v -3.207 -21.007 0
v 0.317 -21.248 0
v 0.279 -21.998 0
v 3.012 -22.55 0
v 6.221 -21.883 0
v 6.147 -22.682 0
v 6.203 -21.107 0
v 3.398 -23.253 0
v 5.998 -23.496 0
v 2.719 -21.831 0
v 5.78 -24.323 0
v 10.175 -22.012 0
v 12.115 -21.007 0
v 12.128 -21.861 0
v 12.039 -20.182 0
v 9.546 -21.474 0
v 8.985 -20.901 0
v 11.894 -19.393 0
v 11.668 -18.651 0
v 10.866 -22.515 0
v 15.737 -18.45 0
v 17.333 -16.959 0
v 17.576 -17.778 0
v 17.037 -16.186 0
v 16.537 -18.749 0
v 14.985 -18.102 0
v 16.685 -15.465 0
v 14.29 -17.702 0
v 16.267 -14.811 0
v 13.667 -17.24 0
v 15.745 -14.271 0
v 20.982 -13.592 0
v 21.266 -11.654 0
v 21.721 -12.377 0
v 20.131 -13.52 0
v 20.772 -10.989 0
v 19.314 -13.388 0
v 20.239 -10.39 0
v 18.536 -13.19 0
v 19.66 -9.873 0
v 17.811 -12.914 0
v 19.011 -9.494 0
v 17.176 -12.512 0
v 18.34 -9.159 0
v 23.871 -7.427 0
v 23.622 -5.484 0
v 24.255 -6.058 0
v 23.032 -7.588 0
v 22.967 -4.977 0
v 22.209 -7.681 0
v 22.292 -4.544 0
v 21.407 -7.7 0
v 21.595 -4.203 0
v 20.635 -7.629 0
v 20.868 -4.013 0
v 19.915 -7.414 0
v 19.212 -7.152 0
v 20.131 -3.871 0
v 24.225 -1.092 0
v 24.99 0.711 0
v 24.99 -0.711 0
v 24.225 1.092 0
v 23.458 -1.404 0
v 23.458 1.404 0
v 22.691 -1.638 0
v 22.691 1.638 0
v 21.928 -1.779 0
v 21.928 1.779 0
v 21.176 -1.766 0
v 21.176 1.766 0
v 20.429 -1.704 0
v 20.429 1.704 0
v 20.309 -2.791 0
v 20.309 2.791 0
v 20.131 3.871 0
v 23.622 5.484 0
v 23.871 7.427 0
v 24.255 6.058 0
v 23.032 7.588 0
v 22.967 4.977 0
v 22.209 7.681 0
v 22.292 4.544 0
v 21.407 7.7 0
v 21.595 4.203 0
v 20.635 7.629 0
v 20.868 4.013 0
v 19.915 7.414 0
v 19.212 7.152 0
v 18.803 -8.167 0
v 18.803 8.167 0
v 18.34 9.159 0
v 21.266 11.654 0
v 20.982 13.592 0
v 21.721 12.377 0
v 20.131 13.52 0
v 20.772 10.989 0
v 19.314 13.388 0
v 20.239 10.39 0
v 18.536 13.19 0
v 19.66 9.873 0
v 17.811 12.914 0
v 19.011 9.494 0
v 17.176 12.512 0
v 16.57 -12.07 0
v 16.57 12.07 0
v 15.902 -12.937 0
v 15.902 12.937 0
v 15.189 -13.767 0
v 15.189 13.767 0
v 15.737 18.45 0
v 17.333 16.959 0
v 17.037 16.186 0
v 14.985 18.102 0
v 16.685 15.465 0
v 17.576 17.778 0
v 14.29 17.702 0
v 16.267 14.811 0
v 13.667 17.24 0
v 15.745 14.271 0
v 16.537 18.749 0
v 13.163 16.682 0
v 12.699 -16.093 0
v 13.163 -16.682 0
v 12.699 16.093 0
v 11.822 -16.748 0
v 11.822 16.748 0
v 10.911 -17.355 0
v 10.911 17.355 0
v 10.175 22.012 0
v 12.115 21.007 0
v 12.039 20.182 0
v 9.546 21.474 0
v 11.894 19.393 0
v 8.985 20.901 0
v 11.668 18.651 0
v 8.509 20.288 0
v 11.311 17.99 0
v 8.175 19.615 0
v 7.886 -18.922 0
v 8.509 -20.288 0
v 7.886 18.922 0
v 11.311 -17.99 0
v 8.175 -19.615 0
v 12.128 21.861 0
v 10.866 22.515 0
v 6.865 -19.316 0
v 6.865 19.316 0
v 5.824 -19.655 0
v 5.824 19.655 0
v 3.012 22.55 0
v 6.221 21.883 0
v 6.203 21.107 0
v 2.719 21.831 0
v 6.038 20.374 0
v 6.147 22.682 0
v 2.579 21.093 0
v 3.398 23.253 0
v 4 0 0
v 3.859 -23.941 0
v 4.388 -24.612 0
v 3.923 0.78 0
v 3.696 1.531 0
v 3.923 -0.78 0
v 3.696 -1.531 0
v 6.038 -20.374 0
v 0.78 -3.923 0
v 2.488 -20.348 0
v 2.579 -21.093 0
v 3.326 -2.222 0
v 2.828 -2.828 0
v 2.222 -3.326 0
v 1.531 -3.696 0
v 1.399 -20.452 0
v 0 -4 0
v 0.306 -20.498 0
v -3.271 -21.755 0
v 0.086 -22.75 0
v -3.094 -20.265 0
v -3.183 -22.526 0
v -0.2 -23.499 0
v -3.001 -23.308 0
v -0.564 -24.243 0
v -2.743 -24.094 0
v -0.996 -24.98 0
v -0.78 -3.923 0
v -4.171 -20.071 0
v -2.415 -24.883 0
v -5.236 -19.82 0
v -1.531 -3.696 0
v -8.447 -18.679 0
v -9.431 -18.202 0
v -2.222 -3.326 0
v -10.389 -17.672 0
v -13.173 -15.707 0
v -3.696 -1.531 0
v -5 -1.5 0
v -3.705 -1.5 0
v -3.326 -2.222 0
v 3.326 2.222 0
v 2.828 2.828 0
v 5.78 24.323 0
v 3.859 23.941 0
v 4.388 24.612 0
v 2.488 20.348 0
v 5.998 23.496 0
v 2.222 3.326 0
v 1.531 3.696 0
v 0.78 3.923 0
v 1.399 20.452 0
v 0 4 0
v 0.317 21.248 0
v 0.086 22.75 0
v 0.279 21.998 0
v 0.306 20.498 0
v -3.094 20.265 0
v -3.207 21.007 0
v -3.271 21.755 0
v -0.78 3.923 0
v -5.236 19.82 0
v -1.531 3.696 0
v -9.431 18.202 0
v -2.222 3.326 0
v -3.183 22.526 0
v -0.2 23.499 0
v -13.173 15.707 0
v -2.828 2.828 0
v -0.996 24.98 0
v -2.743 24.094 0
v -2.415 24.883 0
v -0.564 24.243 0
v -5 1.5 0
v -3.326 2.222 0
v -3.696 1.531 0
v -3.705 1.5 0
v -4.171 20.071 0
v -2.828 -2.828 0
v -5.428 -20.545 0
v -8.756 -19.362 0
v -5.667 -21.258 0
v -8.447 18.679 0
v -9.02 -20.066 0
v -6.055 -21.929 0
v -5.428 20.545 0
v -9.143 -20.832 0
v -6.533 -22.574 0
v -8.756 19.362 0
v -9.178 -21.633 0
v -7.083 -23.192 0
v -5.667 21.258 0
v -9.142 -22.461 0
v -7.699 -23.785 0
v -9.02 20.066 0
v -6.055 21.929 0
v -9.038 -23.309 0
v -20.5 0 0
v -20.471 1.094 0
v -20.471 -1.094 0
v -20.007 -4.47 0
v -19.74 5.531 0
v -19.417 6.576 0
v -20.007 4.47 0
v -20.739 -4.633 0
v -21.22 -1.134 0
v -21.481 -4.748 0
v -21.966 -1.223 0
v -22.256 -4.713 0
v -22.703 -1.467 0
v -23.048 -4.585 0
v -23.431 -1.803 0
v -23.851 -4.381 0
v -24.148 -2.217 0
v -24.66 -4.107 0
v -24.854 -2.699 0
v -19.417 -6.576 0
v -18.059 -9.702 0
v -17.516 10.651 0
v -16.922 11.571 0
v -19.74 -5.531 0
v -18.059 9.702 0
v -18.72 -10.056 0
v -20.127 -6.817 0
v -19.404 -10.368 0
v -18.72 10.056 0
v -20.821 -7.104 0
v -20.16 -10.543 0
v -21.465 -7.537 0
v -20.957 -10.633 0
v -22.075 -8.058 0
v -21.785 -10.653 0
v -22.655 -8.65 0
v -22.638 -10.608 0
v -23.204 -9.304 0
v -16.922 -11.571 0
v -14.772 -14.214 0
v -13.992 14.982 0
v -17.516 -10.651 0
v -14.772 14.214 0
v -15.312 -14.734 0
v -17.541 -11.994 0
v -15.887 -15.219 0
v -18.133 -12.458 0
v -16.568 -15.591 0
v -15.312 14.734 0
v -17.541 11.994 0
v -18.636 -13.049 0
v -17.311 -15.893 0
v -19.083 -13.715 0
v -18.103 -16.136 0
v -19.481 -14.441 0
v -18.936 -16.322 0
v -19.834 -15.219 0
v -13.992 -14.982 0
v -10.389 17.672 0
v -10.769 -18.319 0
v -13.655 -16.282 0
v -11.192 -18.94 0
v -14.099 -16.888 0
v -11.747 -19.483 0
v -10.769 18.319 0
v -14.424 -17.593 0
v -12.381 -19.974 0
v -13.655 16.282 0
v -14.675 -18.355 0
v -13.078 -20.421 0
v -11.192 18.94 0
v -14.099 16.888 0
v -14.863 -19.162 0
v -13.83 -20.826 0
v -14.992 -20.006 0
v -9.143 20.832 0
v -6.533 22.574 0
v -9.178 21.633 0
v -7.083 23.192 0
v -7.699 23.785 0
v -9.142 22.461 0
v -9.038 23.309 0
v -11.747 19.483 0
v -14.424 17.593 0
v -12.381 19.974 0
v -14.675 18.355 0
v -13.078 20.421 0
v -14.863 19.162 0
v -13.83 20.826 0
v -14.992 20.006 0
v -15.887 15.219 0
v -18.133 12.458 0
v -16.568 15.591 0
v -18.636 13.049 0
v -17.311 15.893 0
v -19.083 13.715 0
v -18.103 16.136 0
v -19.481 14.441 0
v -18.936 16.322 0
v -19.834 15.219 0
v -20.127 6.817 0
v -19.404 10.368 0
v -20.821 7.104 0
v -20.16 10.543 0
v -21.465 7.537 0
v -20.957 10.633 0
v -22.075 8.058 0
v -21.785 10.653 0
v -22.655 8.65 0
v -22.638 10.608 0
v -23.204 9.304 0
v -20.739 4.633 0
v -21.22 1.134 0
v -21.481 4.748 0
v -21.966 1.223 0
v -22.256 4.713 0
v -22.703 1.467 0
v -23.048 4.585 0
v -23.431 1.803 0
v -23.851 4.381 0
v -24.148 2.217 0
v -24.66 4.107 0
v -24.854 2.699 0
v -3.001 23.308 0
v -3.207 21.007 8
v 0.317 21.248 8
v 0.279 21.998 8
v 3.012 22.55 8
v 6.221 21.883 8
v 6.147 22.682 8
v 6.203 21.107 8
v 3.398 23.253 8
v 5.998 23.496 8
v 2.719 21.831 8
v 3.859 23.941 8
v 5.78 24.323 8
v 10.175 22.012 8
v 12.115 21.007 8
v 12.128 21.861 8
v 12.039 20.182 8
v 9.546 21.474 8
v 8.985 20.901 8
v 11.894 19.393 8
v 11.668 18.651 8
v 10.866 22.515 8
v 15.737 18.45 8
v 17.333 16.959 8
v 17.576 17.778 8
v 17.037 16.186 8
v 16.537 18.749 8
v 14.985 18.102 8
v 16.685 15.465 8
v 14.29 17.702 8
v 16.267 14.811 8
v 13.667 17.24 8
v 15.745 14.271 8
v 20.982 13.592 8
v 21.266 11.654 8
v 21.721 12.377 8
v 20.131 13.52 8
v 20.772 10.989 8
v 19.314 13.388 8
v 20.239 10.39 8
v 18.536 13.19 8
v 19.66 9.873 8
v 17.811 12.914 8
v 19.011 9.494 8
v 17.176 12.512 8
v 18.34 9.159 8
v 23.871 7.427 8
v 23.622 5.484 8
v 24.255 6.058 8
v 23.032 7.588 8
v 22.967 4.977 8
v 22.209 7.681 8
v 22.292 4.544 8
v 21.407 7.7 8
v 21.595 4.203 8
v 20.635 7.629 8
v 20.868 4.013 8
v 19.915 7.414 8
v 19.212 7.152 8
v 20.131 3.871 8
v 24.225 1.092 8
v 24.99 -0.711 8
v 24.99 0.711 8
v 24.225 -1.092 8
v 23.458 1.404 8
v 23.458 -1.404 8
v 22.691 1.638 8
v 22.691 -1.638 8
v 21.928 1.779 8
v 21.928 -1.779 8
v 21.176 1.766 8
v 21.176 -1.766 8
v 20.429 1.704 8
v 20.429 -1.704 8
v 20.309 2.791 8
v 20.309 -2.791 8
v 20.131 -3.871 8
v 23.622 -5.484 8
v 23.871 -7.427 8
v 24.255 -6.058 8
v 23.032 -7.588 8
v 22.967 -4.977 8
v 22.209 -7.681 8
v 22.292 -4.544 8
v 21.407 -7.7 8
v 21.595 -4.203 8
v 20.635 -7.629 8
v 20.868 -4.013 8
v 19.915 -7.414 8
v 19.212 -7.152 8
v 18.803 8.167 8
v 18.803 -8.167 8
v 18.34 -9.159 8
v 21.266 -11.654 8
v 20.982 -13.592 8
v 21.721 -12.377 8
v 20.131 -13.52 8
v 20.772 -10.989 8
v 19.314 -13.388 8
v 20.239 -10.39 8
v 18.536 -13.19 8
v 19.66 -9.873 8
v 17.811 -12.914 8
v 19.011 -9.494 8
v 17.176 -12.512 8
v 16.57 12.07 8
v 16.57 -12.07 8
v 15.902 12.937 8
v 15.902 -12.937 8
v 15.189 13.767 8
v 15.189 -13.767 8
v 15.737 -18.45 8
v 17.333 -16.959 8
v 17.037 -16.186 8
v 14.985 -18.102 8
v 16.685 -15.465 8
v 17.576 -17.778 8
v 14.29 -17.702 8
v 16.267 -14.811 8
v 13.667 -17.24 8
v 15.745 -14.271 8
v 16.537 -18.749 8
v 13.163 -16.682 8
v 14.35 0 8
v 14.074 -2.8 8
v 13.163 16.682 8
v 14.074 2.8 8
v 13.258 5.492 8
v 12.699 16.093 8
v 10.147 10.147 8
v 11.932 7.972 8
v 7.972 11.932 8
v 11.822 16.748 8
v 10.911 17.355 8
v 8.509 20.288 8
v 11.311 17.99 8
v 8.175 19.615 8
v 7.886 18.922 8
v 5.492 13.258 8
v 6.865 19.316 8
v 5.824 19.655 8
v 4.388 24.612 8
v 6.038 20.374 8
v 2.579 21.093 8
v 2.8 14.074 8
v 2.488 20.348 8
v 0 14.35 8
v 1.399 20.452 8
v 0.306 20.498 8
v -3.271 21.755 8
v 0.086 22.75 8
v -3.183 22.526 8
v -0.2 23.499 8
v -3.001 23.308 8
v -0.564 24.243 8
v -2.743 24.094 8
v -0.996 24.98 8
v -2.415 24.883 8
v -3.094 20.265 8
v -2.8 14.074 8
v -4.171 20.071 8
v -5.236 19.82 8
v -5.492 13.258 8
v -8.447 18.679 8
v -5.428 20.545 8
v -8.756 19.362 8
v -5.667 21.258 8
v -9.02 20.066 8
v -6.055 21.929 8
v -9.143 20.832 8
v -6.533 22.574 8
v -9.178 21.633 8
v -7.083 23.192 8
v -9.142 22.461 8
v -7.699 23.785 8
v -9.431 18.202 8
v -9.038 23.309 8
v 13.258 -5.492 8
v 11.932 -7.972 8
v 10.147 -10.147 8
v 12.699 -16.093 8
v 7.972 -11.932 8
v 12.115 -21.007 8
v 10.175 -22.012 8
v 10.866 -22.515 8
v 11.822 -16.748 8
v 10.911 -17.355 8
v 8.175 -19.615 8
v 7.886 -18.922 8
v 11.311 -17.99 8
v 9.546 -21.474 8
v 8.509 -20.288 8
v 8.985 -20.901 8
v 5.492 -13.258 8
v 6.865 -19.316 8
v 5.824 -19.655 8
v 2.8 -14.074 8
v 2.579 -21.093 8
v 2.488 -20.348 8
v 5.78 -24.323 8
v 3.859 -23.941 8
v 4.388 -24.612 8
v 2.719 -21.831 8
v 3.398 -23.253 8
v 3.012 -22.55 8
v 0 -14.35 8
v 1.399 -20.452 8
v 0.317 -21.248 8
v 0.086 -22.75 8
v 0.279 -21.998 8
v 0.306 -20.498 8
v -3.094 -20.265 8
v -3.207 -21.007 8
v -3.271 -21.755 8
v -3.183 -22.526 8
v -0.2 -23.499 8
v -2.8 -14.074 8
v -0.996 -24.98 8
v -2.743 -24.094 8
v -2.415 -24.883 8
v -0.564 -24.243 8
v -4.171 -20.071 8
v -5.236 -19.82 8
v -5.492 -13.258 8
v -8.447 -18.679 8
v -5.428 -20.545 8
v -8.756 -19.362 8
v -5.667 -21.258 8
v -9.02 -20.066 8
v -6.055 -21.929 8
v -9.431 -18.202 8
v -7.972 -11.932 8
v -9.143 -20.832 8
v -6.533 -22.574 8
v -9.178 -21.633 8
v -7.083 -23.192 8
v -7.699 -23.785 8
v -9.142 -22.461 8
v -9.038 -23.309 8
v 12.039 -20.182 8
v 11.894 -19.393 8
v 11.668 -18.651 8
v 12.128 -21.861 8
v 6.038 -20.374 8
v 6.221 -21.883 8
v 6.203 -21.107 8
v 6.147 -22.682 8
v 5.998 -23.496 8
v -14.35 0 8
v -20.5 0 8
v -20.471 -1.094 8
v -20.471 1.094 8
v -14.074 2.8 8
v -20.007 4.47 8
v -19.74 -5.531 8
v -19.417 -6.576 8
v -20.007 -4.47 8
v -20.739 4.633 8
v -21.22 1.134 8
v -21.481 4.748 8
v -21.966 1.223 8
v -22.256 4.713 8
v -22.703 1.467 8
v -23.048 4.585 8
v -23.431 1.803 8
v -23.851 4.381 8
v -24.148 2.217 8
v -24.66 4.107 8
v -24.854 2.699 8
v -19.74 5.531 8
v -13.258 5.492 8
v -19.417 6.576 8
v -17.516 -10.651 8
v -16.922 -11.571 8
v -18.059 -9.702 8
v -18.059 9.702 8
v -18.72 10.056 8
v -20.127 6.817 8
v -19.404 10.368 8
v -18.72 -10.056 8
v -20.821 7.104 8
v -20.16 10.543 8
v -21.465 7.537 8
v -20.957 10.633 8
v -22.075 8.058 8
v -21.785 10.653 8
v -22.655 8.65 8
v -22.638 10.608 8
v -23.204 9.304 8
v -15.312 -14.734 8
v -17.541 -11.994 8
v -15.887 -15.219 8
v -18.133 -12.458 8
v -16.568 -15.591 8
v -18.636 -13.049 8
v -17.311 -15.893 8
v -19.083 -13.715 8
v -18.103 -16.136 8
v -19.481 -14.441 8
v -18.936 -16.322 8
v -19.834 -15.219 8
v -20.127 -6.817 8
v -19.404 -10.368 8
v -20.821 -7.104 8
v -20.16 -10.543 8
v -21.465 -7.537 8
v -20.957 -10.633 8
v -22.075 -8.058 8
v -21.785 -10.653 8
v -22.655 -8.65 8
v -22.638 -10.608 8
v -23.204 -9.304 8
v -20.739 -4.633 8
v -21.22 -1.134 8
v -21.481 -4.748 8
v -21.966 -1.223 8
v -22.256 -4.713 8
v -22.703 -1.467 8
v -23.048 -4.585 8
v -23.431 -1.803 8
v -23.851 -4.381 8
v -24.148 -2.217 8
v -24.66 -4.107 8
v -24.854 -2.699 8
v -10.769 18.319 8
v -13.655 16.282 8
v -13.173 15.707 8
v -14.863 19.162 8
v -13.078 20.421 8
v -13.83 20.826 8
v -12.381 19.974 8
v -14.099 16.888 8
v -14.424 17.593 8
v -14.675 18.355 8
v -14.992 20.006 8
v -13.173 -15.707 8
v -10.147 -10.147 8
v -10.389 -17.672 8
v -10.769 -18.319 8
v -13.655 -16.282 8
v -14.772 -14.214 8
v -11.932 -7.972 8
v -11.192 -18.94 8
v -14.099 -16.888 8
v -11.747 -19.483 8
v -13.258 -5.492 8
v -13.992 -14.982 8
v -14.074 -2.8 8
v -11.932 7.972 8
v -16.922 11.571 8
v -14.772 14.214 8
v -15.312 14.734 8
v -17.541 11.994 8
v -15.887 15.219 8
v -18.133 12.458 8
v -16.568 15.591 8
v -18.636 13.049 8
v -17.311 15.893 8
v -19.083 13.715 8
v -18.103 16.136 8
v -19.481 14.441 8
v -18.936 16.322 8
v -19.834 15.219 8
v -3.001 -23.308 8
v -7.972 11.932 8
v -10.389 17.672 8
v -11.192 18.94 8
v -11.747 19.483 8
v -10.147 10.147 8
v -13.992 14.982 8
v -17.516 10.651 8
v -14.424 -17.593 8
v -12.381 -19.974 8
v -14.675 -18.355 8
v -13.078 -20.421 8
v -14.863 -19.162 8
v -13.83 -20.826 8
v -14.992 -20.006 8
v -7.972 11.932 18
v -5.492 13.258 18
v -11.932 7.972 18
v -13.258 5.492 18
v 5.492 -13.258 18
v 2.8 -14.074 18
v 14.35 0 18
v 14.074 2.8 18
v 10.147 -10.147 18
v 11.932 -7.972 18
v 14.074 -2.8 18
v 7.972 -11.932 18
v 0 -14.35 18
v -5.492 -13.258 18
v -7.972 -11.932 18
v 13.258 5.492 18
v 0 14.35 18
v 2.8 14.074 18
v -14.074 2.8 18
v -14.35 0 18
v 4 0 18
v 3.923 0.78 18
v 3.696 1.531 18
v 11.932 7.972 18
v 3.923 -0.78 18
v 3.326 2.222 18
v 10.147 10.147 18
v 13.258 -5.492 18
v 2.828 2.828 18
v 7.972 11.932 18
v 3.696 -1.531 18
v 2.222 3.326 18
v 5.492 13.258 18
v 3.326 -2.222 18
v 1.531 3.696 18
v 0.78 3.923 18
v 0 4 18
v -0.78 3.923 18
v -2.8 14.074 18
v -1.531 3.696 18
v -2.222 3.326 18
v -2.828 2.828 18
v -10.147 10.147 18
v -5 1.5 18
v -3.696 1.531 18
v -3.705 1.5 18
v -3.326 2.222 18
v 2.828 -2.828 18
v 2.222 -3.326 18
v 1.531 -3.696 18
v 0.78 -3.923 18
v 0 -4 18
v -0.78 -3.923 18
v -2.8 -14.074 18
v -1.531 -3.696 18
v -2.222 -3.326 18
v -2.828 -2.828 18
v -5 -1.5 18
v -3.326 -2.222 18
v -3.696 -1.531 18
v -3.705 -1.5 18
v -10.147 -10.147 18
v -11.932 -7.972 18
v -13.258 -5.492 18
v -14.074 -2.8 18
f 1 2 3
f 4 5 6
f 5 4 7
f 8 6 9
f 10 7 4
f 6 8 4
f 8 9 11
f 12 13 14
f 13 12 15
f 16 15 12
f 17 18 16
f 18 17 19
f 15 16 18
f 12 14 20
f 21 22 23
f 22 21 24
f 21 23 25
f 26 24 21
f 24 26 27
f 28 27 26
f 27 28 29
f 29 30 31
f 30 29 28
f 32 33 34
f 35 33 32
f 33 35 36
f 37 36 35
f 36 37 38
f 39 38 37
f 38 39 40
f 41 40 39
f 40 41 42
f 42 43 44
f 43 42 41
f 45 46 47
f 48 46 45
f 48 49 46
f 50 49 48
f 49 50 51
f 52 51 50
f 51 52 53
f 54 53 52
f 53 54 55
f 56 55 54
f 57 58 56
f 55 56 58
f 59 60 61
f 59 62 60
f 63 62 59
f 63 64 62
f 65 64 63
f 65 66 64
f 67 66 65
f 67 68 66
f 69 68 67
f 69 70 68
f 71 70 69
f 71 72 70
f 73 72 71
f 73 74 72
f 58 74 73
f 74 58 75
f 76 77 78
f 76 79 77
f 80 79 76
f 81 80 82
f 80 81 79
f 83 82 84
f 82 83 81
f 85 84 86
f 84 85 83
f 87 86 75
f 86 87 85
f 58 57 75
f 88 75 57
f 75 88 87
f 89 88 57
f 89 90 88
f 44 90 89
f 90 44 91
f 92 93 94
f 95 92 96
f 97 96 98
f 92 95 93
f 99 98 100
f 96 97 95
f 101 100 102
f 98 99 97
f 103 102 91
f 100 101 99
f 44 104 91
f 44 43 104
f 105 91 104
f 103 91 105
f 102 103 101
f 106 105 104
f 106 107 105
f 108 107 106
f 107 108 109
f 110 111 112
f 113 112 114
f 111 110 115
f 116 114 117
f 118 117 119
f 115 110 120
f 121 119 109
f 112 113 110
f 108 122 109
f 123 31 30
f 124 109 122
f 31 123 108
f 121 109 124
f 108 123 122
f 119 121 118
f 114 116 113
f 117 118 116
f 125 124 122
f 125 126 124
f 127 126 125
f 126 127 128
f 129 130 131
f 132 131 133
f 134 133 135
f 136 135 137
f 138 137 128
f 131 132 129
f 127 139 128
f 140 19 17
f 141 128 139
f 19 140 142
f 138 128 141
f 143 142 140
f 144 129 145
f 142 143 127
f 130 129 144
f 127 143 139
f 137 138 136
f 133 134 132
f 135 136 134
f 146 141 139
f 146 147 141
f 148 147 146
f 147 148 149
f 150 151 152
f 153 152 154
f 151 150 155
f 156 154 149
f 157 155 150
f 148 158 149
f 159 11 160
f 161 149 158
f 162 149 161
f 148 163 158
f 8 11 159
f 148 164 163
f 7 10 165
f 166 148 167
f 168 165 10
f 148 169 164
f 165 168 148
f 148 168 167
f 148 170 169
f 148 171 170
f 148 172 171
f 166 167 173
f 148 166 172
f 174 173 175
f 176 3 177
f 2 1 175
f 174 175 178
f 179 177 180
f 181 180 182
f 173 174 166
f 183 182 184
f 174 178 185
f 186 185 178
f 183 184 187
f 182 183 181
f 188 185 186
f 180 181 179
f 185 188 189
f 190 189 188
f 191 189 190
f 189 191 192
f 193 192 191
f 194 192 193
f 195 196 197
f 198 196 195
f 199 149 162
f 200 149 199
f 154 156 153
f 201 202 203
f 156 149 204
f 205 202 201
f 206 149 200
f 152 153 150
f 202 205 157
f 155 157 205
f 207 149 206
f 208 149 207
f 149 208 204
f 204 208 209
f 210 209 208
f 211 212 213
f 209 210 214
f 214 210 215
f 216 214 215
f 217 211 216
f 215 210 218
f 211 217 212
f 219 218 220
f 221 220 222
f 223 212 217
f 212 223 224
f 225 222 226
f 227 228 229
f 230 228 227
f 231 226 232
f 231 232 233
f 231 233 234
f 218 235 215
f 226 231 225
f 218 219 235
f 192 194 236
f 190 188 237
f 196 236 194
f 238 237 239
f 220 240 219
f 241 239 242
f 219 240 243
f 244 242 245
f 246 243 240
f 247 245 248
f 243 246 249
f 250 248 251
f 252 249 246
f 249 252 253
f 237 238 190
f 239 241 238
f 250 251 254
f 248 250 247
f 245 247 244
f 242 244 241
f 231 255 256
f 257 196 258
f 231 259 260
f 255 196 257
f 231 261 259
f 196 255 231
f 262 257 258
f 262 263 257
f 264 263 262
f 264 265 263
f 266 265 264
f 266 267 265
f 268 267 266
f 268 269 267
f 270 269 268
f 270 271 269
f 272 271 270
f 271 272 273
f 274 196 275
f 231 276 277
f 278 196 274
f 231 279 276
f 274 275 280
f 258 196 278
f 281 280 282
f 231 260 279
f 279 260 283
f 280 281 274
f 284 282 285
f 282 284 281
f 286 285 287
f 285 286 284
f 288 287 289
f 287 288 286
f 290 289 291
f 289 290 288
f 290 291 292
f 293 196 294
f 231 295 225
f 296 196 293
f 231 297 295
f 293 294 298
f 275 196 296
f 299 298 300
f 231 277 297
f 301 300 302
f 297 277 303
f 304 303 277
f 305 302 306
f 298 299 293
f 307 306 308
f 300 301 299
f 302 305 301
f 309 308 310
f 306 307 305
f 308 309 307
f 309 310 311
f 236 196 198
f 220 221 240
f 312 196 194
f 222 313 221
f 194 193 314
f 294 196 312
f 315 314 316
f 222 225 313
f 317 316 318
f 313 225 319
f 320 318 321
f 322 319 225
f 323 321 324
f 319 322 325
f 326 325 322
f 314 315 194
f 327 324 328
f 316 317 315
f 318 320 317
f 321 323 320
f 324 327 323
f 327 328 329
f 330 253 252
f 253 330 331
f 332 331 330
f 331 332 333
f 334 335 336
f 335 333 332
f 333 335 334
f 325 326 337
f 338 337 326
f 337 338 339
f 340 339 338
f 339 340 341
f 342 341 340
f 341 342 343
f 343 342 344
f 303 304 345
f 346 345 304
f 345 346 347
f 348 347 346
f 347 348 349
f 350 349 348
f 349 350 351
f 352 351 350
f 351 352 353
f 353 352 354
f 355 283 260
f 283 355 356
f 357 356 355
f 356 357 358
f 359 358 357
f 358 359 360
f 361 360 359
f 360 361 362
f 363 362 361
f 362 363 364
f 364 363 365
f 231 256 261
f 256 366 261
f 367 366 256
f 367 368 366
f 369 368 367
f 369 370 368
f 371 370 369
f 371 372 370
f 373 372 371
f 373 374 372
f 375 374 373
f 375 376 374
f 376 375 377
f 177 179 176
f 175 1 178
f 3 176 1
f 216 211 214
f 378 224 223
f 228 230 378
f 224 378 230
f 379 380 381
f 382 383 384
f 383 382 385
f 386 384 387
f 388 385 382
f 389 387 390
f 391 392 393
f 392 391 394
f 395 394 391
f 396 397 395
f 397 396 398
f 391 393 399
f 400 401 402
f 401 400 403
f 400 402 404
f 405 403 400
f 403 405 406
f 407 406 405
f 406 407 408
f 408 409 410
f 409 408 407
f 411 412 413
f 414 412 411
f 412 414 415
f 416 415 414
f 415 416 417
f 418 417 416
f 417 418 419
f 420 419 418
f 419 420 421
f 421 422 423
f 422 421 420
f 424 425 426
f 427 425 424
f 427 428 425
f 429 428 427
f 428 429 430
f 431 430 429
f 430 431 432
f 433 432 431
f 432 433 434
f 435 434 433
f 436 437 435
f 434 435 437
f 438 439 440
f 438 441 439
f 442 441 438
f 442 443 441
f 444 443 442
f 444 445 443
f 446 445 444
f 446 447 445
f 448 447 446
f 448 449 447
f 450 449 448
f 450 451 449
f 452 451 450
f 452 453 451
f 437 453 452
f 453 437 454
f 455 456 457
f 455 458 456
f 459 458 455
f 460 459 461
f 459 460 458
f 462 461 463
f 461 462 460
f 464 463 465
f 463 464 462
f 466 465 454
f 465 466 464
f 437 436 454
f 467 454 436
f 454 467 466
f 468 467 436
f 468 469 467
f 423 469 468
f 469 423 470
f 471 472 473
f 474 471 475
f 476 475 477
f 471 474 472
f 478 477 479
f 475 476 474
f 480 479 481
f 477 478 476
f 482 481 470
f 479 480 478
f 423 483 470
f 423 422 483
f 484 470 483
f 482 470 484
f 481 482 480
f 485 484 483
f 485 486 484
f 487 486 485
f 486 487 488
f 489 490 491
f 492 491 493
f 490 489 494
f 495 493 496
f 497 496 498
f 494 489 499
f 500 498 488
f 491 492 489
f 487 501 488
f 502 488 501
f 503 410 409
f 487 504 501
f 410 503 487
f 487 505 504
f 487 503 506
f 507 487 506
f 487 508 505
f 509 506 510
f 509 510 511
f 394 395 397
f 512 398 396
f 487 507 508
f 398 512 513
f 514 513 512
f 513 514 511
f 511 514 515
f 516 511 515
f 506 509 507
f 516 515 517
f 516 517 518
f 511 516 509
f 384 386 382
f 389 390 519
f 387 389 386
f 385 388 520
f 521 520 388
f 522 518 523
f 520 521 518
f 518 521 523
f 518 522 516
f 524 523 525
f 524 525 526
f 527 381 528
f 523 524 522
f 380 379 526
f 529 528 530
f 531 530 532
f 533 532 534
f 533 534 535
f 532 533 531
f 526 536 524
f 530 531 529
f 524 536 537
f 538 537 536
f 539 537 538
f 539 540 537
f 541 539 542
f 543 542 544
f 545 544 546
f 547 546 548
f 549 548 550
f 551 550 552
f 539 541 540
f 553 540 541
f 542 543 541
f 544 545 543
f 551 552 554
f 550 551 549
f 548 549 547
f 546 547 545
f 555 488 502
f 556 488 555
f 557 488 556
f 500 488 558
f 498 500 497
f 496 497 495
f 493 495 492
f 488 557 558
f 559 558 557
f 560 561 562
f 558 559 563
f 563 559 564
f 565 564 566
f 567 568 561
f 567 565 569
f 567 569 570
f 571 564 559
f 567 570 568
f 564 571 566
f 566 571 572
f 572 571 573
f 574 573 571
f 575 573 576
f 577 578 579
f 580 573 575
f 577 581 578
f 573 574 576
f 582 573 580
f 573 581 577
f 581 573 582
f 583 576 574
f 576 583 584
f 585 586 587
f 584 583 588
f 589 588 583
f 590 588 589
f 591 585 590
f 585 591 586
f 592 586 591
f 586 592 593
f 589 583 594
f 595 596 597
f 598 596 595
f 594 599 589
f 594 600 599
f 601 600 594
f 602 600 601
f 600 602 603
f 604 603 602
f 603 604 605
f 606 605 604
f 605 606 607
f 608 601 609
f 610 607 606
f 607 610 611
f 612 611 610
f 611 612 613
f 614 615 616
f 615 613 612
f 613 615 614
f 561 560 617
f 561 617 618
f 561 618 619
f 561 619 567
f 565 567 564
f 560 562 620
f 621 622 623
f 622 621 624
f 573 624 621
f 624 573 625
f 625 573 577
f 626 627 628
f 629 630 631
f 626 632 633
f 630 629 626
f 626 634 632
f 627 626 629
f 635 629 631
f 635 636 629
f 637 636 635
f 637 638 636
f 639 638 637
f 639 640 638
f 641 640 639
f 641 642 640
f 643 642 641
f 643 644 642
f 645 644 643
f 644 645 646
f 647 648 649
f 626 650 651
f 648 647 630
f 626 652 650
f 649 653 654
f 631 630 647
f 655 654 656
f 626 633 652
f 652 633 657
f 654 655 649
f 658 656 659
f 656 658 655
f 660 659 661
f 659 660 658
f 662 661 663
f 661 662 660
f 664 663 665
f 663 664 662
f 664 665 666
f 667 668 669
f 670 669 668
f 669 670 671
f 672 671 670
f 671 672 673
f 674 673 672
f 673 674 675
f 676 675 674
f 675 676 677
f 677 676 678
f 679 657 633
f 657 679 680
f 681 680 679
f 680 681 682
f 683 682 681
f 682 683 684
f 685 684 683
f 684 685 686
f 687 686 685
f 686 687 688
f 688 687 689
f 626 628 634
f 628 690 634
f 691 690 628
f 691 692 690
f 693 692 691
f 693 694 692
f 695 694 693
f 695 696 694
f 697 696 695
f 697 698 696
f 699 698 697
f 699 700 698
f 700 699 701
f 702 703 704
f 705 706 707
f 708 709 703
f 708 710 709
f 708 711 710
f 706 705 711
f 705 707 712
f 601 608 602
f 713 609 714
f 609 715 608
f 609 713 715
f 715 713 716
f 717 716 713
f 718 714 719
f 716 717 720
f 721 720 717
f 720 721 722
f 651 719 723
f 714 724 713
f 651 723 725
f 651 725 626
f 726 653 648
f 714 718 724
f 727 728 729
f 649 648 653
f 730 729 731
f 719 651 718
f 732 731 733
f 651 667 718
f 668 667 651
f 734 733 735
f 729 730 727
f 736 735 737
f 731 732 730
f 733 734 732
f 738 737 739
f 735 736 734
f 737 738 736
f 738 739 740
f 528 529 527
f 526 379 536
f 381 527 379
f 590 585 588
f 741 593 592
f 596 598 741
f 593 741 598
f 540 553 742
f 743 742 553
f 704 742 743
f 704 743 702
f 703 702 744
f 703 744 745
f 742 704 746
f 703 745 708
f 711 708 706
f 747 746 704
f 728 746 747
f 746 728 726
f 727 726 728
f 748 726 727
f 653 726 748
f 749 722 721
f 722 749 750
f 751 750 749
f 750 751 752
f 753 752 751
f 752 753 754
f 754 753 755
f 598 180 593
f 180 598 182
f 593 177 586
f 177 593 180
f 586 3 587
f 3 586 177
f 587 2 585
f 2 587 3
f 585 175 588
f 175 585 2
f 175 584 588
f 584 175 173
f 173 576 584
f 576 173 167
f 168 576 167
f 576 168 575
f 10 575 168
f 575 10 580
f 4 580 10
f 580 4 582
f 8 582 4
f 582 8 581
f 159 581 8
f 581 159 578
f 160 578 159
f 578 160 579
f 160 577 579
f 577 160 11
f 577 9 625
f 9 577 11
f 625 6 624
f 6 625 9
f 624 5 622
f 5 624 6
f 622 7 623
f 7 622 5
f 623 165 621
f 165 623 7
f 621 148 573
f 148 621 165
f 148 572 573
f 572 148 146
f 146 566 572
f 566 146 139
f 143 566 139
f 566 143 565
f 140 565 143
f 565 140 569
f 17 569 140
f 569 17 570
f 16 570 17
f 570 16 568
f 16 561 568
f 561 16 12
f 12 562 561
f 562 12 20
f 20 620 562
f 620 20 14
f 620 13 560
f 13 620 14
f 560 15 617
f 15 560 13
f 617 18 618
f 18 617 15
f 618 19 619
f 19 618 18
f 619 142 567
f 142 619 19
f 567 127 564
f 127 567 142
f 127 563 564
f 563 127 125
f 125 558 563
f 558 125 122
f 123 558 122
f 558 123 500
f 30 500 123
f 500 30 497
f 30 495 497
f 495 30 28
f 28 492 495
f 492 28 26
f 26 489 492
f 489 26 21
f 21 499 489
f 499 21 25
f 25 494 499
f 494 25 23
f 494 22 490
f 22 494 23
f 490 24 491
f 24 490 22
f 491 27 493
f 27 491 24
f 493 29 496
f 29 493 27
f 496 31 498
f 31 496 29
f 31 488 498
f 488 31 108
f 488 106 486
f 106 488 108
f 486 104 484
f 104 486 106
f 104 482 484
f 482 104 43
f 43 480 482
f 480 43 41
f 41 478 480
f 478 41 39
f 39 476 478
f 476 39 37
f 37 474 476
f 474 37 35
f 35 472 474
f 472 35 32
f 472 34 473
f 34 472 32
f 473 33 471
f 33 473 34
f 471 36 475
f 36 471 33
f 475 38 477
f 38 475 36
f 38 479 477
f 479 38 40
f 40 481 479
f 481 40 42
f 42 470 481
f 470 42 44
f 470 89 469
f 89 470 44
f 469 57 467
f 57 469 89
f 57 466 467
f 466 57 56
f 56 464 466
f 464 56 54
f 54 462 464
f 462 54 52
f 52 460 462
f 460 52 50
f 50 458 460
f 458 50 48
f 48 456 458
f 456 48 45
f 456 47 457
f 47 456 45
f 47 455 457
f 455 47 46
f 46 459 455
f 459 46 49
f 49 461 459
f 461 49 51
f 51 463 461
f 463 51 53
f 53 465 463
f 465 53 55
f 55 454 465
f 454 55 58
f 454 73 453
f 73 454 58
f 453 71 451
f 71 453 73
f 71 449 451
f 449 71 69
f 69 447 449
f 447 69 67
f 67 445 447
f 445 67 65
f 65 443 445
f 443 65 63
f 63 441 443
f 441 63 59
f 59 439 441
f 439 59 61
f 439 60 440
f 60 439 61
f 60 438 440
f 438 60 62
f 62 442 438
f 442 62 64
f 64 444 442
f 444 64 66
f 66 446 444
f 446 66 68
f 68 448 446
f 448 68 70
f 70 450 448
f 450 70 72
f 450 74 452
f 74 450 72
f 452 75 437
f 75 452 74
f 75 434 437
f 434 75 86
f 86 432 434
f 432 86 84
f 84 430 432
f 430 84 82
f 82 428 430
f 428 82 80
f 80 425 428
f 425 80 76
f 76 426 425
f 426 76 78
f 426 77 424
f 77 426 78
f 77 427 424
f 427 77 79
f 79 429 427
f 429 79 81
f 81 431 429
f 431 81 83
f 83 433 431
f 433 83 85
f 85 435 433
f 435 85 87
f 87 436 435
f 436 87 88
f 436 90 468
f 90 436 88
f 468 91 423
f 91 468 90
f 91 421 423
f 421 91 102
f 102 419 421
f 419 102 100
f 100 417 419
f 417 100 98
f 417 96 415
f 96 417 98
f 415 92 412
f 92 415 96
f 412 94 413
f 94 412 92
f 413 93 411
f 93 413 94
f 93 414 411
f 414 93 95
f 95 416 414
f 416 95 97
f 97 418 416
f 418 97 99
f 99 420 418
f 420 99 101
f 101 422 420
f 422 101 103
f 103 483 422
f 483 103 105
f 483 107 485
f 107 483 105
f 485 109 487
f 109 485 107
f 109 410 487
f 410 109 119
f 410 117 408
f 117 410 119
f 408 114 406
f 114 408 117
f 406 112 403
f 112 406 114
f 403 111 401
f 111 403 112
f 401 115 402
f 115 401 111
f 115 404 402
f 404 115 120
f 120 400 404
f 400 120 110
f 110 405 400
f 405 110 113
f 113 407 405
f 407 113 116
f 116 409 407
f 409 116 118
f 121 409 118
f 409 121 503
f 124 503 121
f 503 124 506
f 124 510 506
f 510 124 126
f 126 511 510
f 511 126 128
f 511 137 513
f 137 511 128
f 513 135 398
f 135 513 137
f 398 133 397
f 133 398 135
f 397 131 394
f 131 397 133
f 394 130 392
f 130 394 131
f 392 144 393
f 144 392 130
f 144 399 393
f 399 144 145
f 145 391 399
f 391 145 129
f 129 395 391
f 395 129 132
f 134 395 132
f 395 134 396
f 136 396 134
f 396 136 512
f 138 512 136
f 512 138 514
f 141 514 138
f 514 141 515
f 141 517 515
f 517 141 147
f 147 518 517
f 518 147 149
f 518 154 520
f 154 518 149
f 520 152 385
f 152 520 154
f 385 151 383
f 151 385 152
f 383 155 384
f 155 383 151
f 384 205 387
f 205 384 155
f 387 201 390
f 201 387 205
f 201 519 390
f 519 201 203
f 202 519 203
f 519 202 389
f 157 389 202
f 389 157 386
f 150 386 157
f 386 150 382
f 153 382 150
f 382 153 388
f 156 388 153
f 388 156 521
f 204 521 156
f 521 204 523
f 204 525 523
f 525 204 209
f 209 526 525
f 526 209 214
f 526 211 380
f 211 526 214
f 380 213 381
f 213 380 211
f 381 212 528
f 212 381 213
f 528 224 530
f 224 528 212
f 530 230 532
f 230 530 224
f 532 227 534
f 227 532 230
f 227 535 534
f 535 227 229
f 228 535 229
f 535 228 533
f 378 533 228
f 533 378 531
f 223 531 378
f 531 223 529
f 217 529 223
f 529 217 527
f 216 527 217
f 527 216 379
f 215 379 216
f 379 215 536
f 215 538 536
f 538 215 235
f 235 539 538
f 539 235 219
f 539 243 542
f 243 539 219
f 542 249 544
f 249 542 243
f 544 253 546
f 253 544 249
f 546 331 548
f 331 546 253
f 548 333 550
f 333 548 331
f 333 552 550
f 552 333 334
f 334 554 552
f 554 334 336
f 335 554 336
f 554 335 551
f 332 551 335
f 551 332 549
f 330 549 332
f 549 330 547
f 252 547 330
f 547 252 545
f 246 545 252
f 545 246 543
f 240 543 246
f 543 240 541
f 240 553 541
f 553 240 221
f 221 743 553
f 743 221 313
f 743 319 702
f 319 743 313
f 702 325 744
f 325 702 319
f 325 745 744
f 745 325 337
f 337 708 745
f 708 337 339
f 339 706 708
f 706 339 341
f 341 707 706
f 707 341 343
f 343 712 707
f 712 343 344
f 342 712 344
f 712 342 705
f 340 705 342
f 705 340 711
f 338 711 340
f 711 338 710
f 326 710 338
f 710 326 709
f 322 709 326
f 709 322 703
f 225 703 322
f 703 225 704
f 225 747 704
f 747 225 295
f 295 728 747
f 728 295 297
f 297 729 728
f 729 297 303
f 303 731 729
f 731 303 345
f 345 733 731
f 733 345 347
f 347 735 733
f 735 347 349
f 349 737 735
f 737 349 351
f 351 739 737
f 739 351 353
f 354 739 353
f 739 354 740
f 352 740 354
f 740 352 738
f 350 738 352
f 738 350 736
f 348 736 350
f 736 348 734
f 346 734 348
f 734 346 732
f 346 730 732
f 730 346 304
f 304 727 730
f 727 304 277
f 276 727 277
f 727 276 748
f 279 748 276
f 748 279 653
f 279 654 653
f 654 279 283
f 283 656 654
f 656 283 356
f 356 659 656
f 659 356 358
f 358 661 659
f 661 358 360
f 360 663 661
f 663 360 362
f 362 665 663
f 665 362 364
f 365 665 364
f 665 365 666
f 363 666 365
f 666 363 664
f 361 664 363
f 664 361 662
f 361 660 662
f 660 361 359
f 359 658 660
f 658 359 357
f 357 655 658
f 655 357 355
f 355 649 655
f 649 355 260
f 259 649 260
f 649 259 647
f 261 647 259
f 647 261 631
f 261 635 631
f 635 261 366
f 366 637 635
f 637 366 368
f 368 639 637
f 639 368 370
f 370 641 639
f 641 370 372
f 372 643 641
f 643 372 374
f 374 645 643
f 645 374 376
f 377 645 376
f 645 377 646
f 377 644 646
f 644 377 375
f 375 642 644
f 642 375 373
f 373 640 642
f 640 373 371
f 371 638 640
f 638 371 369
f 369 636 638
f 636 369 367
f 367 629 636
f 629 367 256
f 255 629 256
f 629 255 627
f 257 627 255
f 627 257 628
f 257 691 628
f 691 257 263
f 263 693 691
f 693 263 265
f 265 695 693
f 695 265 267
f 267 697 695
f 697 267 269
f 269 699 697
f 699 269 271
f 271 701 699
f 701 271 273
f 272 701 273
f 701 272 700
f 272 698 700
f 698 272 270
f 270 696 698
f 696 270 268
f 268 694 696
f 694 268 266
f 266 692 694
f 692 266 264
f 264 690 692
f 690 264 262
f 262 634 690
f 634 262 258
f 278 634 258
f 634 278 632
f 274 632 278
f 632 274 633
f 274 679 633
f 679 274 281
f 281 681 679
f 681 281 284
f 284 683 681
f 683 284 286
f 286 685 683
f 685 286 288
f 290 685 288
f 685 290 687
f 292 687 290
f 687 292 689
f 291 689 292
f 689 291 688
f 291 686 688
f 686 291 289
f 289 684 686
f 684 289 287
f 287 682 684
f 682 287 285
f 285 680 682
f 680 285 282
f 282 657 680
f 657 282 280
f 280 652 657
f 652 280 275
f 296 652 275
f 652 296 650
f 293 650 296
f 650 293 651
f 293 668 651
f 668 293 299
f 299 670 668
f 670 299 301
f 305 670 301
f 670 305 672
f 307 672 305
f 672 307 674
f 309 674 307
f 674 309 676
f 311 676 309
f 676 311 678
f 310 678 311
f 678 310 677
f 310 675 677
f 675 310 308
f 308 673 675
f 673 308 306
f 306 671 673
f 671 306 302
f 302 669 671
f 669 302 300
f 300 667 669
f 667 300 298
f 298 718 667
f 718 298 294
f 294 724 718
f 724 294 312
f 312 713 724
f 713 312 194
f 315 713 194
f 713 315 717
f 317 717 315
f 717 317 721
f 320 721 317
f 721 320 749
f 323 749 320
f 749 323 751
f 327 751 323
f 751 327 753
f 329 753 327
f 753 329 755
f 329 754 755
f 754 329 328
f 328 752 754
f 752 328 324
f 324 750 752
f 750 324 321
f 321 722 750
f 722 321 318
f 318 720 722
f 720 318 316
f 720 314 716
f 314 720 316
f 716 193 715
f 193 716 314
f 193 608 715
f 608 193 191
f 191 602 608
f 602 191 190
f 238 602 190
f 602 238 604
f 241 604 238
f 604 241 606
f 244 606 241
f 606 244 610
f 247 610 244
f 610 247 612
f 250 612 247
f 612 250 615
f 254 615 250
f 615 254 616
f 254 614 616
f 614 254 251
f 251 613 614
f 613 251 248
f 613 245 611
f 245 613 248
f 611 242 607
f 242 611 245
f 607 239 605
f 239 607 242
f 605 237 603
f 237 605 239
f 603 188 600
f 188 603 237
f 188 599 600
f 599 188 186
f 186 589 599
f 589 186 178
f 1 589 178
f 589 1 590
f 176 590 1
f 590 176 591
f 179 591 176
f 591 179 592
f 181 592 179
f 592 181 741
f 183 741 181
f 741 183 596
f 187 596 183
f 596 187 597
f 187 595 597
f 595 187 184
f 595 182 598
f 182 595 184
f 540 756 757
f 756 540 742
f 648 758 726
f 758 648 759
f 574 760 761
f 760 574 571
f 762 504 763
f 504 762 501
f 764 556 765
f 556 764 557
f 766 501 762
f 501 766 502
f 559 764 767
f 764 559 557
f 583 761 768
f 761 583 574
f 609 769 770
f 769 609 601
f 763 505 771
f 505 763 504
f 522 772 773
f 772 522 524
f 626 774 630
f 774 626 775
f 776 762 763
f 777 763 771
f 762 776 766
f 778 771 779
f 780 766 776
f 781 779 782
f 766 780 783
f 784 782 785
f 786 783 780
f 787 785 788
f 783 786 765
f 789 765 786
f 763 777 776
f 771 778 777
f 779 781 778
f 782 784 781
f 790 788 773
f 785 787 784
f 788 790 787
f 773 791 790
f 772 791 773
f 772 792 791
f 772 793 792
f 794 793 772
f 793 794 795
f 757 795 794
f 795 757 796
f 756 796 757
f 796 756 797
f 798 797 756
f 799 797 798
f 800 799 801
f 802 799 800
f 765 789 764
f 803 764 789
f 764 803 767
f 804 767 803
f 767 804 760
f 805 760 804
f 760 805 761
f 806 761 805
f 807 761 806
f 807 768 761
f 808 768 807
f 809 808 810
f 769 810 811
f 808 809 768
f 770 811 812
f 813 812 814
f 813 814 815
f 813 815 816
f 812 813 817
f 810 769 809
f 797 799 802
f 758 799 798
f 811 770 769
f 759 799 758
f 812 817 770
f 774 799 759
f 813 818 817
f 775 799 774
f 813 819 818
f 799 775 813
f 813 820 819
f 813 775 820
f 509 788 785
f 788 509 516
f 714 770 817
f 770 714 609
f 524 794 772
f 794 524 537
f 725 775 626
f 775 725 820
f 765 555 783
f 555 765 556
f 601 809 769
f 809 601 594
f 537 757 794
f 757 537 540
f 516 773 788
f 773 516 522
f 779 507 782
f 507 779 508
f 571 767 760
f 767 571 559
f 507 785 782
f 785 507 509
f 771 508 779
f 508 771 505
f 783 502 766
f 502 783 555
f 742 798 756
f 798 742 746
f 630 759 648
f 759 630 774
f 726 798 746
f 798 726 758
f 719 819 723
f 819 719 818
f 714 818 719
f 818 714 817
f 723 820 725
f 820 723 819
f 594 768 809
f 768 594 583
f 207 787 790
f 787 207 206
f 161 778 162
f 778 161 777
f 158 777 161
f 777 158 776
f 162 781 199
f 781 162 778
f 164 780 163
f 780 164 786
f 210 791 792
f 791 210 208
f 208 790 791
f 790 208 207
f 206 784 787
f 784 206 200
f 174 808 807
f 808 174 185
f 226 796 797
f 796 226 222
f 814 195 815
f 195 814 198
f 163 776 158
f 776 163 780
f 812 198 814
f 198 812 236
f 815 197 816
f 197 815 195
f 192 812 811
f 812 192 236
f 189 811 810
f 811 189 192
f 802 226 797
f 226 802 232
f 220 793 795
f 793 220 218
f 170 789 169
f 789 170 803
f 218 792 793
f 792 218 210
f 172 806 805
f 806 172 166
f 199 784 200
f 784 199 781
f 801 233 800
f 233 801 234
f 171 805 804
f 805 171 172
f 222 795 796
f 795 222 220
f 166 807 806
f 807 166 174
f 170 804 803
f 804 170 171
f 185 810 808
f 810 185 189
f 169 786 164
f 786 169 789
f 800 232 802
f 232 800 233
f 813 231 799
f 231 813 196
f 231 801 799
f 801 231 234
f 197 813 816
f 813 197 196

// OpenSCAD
$fn = 32;

// ----------------------------------------------------------------------
// Spur gear: m=2 z=23, 50 mm tip diameter x 18 mm
// ----------------------------------------------------------------------

// --- parameters (mm) ---
modul = 2;                // module
n_teeth = 23;             // number of teeth
width = 8;                // face width
pa = 20;                  // pressure angle, deg
shaft_d = 8;              // shaft bore
boss_d = 28.7;            // hub diameter
boss_h = 10;              // hub above the face
key_w = 3;                // keyway width
key_h = 1.4;              // keyway depth

/* --- involute profile --- */
pitch_r = modul * n_teeth / 2;
base_r = pitch_r * cos(pa);
tip_r = pitch_r + modul;
root_r = pitch_r - 1.25 * modul;
flank_steps = 6;

function inv_deg(a) = (tan(a) - a * PI / 180) * 180 / PI;
function flank_r(i) = root_r + (tip_r - root_r) * i / flank_steps;
function half_angle(r) = 90 / n_teeth + inv_deg(pa) - inv_deg(acos(min(1, base_r / r)));
function tooth_pt(k, i, side) =
    let (r = flank_r(i), a = k * 360 / n_teeth + side * half_angle(r))
    [r * cos(a), r * sin(a)];

module tooth_profile() {
  polygon(points = [
    for (k = [0 : n_teeth - 1])
      each [
        for (i = [0 : flank_steps]) tooth_pt(k, i, -1),
        for (i = [flank_steps : -1 : 0]) tooth_pt(k, i, 1),
        let (ta = (k + 0.5) * 360 / n_teeth)
          [root_r * cos(ta), root_r * sin(ta)]
      ]
  ]);
}

module gear_disc() {
  linear_extrude(height = width) tooth_profile();
}

module hub_boss() {
  translate([0, 0, width - 1]) cylinder(h = boss_h + 1, d = boss_d);
}

difference() {
  union() {
    gear_disc();
    hub_boss();
  }
  translate([0, 0, -1]) cylinder(h = width + boss_h + 3, d = shaft_d);
  /* keyway on the bore */
  translate([-shaft_d / 2 - 1, -key_w / 2, -1]) cube([key_h + 1, key_w, width + boss_h + 3]);
}
